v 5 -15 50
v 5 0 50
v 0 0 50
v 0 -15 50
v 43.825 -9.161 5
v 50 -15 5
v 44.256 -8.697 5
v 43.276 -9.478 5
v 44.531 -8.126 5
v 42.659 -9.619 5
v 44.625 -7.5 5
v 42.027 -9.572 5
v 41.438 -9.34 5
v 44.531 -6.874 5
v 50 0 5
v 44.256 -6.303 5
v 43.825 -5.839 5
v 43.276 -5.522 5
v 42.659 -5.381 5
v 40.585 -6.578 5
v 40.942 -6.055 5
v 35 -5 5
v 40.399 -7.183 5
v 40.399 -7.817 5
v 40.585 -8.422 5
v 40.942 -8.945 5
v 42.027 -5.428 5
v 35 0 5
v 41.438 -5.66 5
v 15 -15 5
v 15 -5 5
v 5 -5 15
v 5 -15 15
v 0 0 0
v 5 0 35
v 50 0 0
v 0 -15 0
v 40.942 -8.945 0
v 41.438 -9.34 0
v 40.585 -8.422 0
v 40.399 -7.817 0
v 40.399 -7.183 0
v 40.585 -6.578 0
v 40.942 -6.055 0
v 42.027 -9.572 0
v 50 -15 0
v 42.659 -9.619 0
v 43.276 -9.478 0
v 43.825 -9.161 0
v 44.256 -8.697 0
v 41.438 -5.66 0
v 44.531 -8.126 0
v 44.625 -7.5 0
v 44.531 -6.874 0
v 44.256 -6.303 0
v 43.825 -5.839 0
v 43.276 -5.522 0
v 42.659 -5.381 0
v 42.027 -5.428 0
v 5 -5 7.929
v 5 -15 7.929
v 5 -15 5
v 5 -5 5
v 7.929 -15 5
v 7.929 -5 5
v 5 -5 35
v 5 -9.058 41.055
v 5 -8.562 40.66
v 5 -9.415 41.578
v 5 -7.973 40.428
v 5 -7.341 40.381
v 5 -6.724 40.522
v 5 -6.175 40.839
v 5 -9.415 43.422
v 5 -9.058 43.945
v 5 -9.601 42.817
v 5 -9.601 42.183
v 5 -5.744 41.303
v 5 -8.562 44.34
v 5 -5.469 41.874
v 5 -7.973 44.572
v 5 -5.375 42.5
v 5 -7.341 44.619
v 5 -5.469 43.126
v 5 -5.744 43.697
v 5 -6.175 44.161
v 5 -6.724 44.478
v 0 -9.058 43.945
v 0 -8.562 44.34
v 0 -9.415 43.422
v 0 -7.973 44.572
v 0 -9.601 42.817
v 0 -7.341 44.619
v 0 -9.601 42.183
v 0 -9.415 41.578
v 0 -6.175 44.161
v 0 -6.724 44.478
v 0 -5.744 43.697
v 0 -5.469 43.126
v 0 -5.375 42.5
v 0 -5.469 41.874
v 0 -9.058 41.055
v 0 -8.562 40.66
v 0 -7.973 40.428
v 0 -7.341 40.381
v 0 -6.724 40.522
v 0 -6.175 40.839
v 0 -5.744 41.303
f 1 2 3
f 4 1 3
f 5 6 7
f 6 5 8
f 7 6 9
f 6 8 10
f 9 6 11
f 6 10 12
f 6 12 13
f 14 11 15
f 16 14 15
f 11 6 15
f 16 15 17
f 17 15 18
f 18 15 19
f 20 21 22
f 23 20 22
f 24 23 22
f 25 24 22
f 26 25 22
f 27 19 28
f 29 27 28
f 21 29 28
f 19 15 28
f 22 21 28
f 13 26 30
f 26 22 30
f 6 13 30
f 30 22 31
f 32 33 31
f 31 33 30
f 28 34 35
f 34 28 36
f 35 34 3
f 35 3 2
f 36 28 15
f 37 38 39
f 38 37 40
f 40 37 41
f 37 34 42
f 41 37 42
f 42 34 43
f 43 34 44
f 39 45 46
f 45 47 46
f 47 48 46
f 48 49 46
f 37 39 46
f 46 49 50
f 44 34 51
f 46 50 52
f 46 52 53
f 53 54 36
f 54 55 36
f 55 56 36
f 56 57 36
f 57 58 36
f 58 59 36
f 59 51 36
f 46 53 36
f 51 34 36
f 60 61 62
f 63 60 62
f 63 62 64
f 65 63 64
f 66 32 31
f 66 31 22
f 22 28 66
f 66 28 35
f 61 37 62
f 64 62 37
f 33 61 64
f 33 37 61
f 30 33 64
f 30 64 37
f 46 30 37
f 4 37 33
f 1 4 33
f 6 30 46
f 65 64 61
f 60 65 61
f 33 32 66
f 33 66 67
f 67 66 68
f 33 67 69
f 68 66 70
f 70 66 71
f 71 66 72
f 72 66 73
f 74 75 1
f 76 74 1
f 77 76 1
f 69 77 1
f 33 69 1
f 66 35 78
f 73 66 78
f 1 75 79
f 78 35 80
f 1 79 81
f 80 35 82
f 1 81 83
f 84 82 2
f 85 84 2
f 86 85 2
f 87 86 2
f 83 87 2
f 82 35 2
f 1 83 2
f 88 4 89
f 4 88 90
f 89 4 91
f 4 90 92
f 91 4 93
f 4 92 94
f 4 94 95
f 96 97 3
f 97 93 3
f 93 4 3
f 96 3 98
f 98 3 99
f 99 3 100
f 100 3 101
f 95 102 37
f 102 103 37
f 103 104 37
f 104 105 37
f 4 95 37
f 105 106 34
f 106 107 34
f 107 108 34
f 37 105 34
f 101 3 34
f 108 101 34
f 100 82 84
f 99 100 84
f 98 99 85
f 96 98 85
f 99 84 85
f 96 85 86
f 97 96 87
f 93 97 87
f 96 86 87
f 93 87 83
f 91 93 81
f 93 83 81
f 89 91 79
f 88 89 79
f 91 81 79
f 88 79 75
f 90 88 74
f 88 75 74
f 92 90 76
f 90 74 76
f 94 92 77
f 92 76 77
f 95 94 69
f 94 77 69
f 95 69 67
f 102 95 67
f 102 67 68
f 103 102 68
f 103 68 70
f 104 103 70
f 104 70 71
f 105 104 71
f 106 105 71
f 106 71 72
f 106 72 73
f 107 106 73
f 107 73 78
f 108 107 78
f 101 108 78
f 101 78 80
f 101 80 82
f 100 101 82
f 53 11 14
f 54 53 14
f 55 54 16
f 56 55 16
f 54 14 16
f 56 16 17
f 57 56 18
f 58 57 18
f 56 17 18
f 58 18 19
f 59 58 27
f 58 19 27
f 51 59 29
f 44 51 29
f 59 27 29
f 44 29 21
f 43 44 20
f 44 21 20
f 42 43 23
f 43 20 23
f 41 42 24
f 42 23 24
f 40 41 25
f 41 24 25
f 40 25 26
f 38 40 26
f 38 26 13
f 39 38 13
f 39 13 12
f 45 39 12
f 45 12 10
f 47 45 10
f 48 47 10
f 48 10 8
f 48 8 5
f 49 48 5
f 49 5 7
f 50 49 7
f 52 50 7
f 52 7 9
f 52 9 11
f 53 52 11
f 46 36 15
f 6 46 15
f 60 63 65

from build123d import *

# Parameters (mm, degrees)
F1_DEPTH = 15
F2_R     = 2.125
F3_DEPTH = 25
F4_R     = 2.125
F5_DEPTH = 25
F7_DEPTH = 10
F9_DEPTH = 10


with BuildPart() as f1:
    # F0 (on Front) → F1 (new body)
    with BuildSketch(Plane.XZ):
        Polygon((5, 50), (0, 50), (0, 0), (50, 0), (50, 5), (35, 5), (5, 35), align=None)
    extrude(amount=F1_DEPTH)

    # F2 (on face) → F3 (cut)
    with BuildSketch(Plane.XY.offset(5)):
        with Locations((42.5, -7.5)):
            Circle(F2_R)
    extrude(amount=-F3_DEPTH, mode=Mode.SUBTRACT)

    # F4 (on face) → F5 (cut)
    with BuildSketch(Plane.YZ.offset(5)):
        with Locations((-7.5, 42.5)):
            Circle(F4_R)
    extrude(amount=-F5_DEPTH, mode=Mode.SUBTRACT)

    # F6 (on face) → F7 (cut)
    with BuildSketch(Plane.XZ.offset(15)):
        Polygon((35, 5), (5, 35), (5, 15), (15, 5), align=None)
    extrude(amount=-F7_DEPTH, mode=Mode.SUBTRACT)

    # F8 (on face) → F9 (cut)
    with BuildSketch(Plane.XZ.offset(15)):
        Polygon((7.928932, 5), (5, 7.928932), (5, 5), align=None)
    extrude(amount=-F9_DEPTH, mode=Mode.SUBTRACT)


solid = f1.part
